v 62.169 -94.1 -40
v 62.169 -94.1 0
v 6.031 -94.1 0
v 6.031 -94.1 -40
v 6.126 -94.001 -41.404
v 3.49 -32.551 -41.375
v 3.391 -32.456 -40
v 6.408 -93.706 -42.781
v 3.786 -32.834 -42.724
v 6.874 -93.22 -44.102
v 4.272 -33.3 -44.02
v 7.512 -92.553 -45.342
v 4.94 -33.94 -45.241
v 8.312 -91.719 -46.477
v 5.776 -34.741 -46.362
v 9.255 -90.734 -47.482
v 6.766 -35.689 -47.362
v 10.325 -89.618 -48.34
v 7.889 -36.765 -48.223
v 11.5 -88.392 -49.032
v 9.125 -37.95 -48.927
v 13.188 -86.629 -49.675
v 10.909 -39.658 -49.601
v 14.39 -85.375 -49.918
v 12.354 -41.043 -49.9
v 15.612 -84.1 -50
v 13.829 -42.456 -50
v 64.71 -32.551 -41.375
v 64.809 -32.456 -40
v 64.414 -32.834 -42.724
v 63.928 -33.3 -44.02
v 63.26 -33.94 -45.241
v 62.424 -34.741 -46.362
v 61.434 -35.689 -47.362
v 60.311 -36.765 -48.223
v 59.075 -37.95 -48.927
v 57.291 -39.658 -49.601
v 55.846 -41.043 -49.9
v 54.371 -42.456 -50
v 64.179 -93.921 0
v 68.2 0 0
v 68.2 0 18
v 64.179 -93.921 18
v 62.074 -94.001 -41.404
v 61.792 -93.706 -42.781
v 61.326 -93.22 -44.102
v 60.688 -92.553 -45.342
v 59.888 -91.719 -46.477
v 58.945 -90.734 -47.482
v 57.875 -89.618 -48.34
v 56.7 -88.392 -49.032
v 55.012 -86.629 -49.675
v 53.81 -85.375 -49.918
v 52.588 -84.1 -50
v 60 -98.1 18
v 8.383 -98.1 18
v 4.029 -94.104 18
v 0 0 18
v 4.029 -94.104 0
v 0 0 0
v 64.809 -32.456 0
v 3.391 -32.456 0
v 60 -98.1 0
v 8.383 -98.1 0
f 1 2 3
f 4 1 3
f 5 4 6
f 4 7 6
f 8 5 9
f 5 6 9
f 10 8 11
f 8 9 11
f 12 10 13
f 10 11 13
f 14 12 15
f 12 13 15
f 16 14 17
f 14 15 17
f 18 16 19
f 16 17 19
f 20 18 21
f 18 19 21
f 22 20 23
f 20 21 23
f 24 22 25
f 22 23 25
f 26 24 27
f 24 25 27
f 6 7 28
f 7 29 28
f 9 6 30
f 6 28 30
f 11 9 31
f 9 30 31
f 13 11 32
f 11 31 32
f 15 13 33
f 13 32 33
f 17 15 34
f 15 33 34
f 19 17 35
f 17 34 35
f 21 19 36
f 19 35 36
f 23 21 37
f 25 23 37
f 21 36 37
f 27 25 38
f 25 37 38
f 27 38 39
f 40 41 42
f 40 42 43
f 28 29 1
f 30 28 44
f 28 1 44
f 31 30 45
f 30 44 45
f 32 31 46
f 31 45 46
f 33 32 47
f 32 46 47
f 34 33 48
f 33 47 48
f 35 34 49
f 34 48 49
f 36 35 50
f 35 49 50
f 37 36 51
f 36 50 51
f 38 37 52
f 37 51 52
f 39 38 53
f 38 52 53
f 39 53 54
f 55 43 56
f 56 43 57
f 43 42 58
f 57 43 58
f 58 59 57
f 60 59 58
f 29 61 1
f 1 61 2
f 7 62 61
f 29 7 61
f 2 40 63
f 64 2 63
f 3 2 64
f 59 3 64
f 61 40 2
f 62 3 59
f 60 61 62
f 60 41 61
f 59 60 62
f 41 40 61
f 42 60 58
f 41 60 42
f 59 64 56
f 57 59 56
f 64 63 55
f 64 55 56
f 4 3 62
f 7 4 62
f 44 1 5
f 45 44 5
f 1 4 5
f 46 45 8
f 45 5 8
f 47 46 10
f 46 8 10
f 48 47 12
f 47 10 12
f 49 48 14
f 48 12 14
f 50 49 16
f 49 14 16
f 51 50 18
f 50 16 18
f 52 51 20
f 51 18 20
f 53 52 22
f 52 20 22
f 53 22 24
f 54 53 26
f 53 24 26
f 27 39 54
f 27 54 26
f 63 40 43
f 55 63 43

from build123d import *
from OCP.BRepFilletAPI import BRepFilletAPI_MakeChamfer

# Parameters (mm, degrees)
BOSS_EXTRUDE1_DEPTH = 18
BOSS_EXTRUDE2_DEPTH = 50
CHAMFER1_SIZE       = 4
CHAMFER1_SIZE2      = 4.182741942
FILLET1_R           = 10


with BuildPart() as part:
    # Sketch1 → Boss-Extrude1 (new body)
    with BuildSketch(Plane.XY):
        Polygon((0, 0), (68.2, 0), (64, -98.1), (4.2, -98.1), align=None)
    extrude(amount=BOSS_EXTRUDE1_DEPTH)

    # Sketch2 → Boss-Extrude2 (add)
    with BuildSketch(Plane(origin=(0, 0, 0), x_dir=(-1, 0, 0), z_dir=(0, 0, -1))):
        Polygon((-62.16942167, -94.1), (-6.03057833, -94.1), (-3.391390108, -32.456103661), (-64.808609892, -32.456103661), align=None)
    extrude(amount=BOSS_EXTRUDE2_DEPTH)

    # Chamfer1: one chamfer whose edges measure the first distance from different faces: ONE call of the kernel's chamfer builder (chamfer() names one face for all edges)
    chamfer1_edges_1 = [part.edges().sort_by_distance(p)[0] for p in [
        (64, -98.1, 9),
    ]]
    chamfer1_side_1 = [part.faces().sort_by_distance(p)[0] for p in [
        (34.1, -98.1, 9),
    ]]
    chamfer1_edges_2 = [part.edges().sort_by_distance(p)[0] for p in [
        (4.2, -98.1, 9),
    ]]
    chamfer1_side_2 = [part.faces().sort_by_distance(p)[0] for p in [
        (2.1, -49.05, 9),
    ]]
    chamfer1 = BRepFilletAPI_MakeChamfer(part.part.solid().wrapped)
    for e in chamfer1_edges_1:
        chamfer1.Add(CHAMFER1_SIZE, CHAMFER1_SIZE2, e.wrapped, chamfer1_side_1[0].wrapped)  # the first distance lies on this face
    for e in chamfer1_edges_2:
        chamfer1.Add(CHAMFER1_SIZE, CHAMFER1_SIZE2, e.wrapped, chamfer1_side_2[0].wrapped)  # the first distance lies on this face
    add(Compound.cast(chamfer1.Shape()), mode=Mode.REPLACE)

    # Fillet1
    fillet1_edges = [part.edges().sort_by_distance(p)[0] for p in [
        (63.489015781, -63.27805183, -50),
        (34.1, -94.1, -50),
        (4.710984219, -63.27805183, -50),
        (34.1, -32.456103661, -50),
    ]]
    fillet(fillet1_edges, radius=FILLET1_R)


solid = part.part
